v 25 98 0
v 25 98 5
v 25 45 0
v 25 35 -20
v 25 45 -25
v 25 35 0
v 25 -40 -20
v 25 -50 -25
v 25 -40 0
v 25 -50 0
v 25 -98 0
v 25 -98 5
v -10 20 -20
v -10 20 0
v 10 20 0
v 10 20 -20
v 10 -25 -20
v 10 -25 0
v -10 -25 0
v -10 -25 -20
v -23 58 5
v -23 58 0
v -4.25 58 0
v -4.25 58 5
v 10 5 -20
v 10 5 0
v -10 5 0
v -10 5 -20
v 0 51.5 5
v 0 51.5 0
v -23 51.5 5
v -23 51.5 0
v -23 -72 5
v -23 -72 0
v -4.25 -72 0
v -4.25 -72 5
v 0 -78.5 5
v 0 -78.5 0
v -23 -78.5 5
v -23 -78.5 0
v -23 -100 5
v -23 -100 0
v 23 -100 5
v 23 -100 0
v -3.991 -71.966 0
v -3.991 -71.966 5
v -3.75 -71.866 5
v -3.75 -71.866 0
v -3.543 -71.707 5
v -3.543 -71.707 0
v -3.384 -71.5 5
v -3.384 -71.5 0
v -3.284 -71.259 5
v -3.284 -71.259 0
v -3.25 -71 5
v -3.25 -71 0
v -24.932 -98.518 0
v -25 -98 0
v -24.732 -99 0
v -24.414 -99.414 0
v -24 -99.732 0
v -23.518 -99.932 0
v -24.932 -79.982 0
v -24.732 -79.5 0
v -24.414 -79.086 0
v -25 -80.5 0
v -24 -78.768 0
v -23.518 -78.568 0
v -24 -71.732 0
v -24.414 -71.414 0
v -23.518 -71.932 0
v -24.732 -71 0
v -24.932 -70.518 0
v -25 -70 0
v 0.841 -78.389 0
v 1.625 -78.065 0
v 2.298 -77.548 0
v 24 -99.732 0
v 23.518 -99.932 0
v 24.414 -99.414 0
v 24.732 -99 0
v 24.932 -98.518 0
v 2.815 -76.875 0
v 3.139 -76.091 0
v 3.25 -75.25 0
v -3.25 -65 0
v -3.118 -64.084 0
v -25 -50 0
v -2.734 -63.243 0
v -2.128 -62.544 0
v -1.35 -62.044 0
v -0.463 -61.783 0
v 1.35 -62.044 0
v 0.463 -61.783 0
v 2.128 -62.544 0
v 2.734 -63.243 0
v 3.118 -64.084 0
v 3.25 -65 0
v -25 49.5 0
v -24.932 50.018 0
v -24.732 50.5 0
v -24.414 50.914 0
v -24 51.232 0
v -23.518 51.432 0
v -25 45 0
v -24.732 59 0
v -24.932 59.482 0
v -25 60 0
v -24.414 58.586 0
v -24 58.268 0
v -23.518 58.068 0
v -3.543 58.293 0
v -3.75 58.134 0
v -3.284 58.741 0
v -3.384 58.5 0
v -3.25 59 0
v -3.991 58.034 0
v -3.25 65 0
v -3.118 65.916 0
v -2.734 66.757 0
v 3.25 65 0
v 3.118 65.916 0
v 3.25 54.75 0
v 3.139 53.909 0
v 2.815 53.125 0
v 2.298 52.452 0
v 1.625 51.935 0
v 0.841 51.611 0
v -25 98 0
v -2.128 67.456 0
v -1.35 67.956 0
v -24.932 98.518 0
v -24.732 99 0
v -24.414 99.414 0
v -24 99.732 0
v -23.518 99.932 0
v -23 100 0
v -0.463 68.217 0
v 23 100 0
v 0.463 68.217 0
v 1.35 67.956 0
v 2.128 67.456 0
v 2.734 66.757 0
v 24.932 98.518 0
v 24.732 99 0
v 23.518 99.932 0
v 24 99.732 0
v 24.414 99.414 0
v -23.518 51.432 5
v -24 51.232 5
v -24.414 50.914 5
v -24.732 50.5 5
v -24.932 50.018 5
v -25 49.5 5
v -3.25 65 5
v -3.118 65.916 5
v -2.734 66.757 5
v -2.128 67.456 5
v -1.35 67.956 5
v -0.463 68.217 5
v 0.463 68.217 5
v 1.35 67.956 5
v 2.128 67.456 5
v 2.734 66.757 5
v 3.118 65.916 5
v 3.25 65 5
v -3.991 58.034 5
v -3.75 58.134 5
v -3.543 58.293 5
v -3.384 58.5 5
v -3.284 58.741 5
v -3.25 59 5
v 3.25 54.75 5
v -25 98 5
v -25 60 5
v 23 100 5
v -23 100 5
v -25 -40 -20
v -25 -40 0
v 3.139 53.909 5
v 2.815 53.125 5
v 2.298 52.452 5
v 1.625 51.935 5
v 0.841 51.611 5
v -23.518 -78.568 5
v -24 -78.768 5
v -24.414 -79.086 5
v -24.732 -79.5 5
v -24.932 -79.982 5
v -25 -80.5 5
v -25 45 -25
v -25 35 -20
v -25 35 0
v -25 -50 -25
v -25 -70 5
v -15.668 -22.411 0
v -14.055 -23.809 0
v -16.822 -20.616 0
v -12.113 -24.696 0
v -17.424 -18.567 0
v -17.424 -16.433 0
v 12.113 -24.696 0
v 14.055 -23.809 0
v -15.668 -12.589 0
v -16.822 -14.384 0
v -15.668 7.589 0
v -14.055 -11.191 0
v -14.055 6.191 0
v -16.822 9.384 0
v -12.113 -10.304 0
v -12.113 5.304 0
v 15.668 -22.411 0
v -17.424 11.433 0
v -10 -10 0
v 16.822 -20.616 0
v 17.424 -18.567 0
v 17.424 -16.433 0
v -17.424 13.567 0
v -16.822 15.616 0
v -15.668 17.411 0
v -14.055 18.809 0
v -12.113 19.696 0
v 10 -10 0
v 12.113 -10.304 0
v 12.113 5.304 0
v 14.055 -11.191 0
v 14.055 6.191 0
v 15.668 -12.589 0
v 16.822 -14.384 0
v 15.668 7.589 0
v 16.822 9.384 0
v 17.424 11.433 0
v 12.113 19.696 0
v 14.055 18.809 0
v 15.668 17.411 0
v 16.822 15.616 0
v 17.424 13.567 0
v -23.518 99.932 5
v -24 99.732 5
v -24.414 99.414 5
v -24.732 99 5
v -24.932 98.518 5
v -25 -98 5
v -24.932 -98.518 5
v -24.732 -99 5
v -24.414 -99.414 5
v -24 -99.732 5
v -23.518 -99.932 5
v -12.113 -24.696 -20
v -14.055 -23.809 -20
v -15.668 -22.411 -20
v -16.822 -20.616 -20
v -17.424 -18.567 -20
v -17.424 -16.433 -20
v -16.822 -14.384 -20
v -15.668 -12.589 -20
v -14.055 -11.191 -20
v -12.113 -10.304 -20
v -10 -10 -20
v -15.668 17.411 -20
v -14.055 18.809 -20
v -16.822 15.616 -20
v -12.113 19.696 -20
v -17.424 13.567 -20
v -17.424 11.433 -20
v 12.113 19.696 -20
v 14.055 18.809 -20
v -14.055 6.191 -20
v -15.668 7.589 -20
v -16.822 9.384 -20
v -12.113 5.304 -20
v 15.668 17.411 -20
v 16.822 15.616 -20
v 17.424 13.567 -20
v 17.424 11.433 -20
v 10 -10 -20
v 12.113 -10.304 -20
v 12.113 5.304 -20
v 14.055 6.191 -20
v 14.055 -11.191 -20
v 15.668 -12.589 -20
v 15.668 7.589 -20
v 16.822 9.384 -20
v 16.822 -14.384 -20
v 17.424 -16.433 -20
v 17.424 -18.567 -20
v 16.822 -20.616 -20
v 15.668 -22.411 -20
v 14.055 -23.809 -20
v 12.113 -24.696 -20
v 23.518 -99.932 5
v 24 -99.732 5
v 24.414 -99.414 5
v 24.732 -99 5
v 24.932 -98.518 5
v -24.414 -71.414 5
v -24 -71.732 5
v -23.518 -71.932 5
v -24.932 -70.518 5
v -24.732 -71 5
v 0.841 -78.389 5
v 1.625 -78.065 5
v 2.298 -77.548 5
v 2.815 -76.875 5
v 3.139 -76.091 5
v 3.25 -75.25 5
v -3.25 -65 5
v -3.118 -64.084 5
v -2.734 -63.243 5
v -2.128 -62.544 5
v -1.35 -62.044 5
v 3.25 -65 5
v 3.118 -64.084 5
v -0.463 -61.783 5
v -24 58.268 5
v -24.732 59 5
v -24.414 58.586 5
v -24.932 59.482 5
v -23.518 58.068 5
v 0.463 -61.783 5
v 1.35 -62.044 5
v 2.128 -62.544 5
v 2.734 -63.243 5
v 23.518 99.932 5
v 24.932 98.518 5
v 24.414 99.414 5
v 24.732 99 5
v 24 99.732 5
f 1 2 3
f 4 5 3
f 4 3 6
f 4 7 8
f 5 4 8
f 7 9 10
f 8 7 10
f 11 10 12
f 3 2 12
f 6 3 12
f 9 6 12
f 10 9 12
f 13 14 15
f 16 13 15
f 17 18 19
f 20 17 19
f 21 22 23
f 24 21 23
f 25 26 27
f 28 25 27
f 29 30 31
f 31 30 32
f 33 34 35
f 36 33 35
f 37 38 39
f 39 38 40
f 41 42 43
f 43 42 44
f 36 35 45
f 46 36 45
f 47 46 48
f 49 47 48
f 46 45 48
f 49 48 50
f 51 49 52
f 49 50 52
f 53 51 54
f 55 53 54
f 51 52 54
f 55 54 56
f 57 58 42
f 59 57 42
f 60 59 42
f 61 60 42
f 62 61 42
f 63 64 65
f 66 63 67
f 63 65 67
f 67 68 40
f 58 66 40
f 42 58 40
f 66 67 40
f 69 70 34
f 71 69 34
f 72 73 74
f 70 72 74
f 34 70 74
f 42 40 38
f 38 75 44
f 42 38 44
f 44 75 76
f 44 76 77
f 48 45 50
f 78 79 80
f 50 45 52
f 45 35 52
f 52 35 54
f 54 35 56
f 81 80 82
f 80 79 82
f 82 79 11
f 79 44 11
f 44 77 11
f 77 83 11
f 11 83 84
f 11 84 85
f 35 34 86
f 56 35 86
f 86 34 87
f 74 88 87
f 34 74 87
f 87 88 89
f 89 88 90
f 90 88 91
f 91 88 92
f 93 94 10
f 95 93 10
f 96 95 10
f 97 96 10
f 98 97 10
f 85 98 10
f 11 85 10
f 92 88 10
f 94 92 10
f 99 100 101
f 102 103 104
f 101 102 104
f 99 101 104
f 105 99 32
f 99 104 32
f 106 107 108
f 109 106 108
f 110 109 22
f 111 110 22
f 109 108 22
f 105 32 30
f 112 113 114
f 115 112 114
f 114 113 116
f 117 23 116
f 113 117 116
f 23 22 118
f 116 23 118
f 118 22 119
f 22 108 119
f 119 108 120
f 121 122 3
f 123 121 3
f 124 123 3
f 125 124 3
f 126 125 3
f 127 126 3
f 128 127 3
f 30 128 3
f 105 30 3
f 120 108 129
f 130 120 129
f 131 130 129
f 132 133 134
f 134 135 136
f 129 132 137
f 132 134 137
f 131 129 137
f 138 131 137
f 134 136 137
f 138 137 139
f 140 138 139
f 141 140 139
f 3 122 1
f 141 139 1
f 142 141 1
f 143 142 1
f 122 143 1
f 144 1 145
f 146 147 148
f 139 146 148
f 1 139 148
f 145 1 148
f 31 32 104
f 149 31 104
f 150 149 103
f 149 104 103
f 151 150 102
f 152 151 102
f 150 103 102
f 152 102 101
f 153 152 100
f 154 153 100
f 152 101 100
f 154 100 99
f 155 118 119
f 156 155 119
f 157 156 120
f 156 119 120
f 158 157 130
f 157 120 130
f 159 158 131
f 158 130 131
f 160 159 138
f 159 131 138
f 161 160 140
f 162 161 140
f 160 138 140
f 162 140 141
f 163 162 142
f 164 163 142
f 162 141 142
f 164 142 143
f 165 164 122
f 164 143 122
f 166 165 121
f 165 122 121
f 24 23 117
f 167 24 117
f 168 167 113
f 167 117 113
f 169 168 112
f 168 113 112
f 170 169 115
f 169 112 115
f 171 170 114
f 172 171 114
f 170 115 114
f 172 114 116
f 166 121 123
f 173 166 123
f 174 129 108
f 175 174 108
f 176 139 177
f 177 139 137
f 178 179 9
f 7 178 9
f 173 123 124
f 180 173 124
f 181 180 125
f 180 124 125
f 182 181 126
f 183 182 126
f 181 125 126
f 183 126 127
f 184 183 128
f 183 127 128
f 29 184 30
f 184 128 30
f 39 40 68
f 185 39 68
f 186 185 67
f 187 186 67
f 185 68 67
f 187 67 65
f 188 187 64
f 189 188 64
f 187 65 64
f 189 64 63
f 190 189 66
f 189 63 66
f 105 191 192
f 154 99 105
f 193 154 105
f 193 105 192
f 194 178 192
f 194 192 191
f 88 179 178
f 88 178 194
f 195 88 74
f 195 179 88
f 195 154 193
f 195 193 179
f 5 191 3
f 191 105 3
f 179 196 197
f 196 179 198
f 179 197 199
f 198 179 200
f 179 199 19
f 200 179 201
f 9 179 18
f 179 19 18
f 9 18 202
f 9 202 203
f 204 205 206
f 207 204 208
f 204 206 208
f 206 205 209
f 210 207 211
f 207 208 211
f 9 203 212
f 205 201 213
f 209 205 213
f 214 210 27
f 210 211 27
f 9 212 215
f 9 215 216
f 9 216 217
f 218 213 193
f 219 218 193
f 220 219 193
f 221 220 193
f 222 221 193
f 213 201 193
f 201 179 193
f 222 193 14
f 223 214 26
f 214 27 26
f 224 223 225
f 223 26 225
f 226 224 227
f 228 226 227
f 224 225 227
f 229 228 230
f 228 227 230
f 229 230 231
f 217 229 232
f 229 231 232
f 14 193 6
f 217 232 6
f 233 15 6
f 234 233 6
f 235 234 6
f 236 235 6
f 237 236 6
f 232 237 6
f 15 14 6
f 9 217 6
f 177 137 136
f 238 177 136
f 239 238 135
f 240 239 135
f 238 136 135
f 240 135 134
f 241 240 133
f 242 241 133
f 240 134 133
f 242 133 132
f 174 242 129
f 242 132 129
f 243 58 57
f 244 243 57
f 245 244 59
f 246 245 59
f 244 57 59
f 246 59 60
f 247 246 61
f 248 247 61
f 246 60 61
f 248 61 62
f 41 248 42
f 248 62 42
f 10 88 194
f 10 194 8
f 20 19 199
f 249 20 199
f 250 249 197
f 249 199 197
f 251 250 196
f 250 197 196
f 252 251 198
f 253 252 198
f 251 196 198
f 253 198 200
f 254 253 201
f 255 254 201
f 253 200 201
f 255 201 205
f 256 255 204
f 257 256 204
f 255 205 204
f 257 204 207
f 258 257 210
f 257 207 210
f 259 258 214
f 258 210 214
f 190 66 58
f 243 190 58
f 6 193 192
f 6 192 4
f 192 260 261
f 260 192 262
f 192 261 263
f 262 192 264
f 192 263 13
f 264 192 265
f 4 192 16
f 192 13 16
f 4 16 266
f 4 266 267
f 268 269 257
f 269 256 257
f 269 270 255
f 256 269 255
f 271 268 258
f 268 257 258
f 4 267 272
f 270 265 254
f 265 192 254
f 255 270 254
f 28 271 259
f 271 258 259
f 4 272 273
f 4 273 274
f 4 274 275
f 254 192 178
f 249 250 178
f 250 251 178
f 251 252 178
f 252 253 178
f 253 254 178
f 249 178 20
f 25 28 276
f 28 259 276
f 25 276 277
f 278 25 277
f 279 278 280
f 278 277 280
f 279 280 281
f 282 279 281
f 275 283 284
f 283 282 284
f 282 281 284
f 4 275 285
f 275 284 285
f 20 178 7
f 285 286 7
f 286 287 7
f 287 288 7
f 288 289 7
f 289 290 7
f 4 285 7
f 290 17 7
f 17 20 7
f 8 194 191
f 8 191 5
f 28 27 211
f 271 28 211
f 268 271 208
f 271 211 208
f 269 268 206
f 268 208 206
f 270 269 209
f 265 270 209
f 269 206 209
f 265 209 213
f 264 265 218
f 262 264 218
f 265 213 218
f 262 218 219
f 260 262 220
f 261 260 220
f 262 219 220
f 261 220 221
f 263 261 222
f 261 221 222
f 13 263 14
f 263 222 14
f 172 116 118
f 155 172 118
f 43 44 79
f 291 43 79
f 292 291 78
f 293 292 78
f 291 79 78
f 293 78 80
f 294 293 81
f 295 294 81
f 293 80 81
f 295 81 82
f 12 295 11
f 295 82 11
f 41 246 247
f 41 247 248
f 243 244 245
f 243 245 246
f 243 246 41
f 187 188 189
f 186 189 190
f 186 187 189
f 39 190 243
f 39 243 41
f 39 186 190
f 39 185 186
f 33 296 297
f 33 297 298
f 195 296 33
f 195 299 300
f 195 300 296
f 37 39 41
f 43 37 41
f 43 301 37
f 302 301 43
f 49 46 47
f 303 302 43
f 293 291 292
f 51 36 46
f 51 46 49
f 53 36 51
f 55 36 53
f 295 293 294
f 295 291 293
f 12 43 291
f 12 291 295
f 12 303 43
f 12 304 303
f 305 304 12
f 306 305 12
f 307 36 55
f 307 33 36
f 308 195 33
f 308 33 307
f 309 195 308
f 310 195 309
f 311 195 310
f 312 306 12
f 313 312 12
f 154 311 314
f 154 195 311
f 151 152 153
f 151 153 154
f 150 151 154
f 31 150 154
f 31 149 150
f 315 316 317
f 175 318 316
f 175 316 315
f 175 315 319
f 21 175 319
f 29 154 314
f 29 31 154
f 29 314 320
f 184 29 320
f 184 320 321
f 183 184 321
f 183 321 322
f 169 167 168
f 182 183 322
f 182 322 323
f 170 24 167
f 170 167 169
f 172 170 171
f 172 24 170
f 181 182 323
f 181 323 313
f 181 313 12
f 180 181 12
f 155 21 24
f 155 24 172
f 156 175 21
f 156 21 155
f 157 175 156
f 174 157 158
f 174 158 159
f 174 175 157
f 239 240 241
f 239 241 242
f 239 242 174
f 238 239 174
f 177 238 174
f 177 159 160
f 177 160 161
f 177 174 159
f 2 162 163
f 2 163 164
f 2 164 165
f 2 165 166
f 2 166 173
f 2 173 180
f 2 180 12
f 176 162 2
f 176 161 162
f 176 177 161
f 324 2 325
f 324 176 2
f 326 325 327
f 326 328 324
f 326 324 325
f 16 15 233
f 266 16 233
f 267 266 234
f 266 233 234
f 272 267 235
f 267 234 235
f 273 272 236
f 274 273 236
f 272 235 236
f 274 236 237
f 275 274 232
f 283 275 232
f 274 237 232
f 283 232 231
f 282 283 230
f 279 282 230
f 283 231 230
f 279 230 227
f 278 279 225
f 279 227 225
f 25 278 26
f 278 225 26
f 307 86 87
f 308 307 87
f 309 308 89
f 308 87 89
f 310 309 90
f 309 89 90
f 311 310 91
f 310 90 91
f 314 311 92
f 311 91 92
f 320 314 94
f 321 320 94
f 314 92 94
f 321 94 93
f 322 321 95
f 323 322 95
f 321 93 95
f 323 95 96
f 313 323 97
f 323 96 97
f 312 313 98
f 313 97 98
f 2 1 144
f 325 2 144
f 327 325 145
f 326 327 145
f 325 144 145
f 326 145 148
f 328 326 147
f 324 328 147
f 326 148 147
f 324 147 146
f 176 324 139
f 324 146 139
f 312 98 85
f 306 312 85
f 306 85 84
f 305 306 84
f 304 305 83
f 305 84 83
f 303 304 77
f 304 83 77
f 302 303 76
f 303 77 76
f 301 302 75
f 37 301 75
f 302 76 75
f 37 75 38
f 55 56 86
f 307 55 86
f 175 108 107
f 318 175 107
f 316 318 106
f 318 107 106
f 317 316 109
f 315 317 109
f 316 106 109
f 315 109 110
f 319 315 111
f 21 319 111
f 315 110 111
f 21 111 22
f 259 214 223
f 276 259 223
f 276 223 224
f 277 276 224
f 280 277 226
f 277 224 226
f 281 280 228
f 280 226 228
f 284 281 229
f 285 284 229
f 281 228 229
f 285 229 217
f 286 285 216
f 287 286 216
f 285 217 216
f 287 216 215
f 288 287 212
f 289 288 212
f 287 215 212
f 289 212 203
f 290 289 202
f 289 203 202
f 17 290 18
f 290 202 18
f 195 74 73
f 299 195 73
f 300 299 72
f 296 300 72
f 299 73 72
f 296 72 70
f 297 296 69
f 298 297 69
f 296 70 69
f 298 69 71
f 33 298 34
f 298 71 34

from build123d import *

# Parameters (mm, degrees)
F1_DEPTH = 5
F2_W     = 50
F2_H     = 10
F3_DEPTH = 20
F4_W     = 50
F4_H     = 95
F5_DEPTH = 5


with BuildPart() as f1:
    # F0 (on Top) → F1 (new body)
    with BuildSketch(Plane.XY):
        with BuildLine():
            Line((-23, -100), (23, -100))
            ThreePointArc((23, -100), (24.414214, -99.414214), (25, -98))
            Line((25, -98), (25, 98))
            ThreePointArc((25, 98), (24.414214, 99.414214), (23, 100))
            Line((23, 100), (-23, 100))
            ThreePointArc((-23, 100), (-24.414214, 99.414214), (-25, 98))
            Line((-25, 98), (-25, 60))
            ThreePointArc((-25, 60), (-24.414214, 58.585786), (-23, 58))
            Line((-23, 58), (-4.25, 58))
            ThreePointArc((-4.25, 58), (-3.542893, 58.292893), (-3.25, 59))
            Line((-3.25, 59), (-3.25, 65))
            ThreePointArc((-3.25, 65), (0, 68.25), (3.25, 65))
            Line((3.25, 65), (3.25, 54.75))
            ThreePointArc((3.25, 54.75), (2.298097, 52.451903), (0, 51.5))
            Line((0, 51.5), (-23, 51.5))
            ThreePointArc((-23, 51.5), (-24.414214, 50.914214), (-25, 49.5))
            Line((-25, 49.5), (-25, -70))
            ThreePointArc((-25, -70), (-24.414214, -71.414214), (-23, -72))
            Line((-23, -72), (-4.25, -72))
            ThreePointArc((-4.25, -72), (-3.542893, -71.707107), (-3.25, -71))
            Line((-3.25, -71), (-3.25, -65))
            ThreePointArc((-3.25, -65), (0, -61.75), (3.25, -65))
            Line((3.25, -65), (3.25, -75.25))
            ThreePointArc((3.25, -75.25), (2.298097, -77.548097), (0, -78.5))
            Line((0, -78.5), (-23, -78.5))
            ThreePointArc((-23, -78.5), (-24.414214, -79.085786), (-25, -80.5))
            Line((-25, -80.5), (-25, -98))
            ThreePointArc((-25, -98), (-24.414214, -99.414214), (-23, -100))
        make_face()
    extrude(amount=F1_DEPTH)

    # F2 (on face) → F3 (join)
    with BuildSketch(Plane(origin=(0, 0, 0), x_dir=(1, 0, 0), z_dir=(0, 0, -1))):
        with BuildLine():
            Line((10, 25), (-10, 25))
            ThreePointArc((-10, 25), (-17.5, 17.5), (-10, 10))
            Line((-10, 10), (10, 10))
            ThreePointArc((10, 10), (17.5, 17.5), (10, 25))
        make_face()
        with BuildLine():
            Line((10, -5), (-10, -5))
            ThreePointArc((-10, -5), (-17.5, -12.5), (-10, -20))
            Line((-10, -20), (10, -20))
            ThreePointArc((10, -20), (17.5, -12.5), (10, -5))
        make_face()
        with Locations((0, 45)):
            Rectangle(F2_W, F2_H)
        with Locations((0, -40)):
            Rectangle(F2_W, F2_H)
    extrude(amount=F3_DEPTH)

    # F4 (on face) → F5 (join)
    with BuildSketch(Plane(origin=(0, 0, -20), x_dir=(1, 0, 0), z_dir=(0, 0, -1))):
        with Locations((0, 2.5)):
            Rectangle(F4_W, F4_H)
    extrude(amount=F5_DEPTH)


solid = f1.part
